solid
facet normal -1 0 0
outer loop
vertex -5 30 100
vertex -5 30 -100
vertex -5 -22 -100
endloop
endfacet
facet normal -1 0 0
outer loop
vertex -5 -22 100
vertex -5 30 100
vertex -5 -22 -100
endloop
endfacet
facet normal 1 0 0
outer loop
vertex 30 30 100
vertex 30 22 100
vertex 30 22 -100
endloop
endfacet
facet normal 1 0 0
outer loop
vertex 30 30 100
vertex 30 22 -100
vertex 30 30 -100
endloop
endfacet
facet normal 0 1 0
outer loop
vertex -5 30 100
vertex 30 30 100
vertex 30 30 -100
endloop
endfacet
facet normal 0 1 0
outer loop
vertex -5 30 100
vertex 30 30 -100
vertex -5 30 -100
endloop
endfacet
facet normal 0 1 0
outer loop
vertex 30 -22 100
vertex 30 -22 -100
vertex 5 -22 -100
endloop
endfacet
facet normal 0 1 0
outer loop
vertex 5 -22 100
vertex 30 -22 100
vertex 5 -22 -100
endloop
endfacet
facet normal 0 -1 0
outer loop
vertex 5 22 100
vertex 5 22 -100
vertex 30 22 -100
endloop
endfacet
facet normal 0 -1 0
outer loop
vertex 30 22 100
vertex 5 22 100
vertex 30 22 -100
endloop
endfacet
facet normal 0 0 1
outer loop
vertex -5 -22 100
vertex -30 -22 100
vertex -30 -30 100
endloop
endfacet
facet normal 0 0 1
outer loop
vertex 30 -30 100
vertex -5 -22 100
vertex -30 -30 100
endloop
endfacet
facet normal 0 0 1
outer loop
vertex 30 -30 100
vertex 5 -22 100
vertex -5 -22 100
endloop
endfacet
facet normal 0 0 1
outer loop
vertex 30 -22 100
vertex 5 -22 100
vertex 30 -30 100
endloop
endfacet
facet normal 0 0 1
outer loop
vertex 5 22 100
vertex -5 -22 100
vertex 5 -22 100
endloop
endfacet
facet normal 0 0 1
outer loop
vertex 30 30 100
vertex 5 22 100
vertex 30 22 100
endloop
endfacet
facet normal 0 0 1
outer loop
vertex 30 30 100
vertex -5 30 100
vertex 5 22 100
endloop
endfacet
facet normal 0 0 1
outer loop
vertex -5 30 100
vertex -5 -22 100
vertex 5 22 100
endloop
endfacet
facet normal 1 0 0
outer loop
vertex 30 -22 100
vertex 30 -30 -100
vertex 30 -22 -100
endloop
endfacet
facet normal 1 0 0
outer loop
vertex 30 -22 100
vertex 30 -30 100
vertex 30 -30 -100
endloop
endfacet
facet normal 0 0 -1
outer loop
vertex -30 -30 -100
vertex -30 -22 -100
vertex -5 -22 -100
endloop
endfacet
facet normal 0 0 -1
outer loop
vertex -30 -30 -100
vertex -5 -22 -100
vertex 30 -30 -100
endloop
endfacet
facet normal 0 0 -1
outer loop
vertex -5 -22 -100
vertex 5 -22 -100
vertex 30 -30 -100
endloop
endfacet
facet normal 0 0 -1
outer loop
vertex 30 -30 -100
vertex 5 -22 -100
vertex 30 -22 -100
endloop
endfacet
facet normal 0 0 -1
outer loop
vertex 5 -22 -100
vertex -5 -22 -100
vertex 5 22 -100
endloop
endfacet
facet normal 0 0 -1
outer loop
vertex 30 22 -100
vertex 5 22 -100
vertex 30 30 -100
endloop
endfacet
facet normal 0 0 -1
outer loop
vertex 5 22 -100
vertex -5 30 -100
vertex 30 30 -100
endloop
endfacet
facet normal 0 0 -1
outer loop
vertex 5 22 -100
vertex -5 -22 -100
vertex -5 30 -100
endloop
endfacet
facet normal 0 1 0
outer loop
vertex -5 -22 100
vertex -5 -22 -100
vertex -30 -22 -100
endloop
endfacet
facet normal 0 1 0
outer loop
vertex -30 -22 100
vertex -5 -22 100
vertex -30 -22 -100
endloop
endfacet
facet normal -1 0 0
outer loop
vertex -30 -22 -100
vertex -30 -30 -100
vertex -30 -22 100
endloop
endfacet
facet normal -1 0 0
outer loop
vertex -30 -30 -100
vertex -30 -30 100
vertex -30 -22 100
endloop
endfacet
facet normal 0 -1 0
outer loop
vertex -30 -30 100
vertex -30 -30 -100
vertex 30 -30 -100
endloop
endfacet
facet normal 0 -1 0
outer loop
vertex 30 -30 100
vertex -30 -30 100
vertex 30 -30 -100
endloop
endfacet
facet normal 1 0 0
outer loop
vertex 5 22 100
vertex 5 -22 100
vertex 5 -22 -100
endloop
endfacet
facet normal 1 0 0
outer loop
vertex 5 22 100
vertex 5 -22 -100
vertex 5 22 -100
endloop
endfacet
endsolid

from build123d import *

# Parameters (mm, degrees)
SKETCH_1_W      = 25
SKETCH_1_H      = 8
SKETCH_1_W_2    = 5
EXTRUDE_1_DEPTH = 100


with BuildPart() as part:
    # Эскиз1 → Бобышка-Вытянуть1 (new, symmetric)
    with BuildSketch(Plane.XY):
        with Locations((17.5, -26)):
            Rectangle(SKETCH_1_W, SKETCH_1_H)
        with Locations((2.5, -26)):
            Rectangle(SKETCH_1_W_2, SKETCH_1_H)
        with Locations((-2.5, -26)):
            Rectangle(SKETCH_1_W_2, SKETCH_1_H)
        with Locations((-17.5, -26)):
            Rectangle(SKETCH_1_W, SKETCH_1_H)
        Polygon((0, -22), (5, -22), (5, 22), (0, 22), (0, 30), (-5, 30), (-5, -22), align=None)
        with Locations((17.5, 26)):
            Rectangle(SKETCH_1_W, SKETCH_1_H)
        with Locations((2.5, 26)):
            Rectangle(SKETCH_1_W_2, SKETCH_1_H)
    extrude(amount=EXTRUDE_1_DEPTH, both=True)


solid = part.part
